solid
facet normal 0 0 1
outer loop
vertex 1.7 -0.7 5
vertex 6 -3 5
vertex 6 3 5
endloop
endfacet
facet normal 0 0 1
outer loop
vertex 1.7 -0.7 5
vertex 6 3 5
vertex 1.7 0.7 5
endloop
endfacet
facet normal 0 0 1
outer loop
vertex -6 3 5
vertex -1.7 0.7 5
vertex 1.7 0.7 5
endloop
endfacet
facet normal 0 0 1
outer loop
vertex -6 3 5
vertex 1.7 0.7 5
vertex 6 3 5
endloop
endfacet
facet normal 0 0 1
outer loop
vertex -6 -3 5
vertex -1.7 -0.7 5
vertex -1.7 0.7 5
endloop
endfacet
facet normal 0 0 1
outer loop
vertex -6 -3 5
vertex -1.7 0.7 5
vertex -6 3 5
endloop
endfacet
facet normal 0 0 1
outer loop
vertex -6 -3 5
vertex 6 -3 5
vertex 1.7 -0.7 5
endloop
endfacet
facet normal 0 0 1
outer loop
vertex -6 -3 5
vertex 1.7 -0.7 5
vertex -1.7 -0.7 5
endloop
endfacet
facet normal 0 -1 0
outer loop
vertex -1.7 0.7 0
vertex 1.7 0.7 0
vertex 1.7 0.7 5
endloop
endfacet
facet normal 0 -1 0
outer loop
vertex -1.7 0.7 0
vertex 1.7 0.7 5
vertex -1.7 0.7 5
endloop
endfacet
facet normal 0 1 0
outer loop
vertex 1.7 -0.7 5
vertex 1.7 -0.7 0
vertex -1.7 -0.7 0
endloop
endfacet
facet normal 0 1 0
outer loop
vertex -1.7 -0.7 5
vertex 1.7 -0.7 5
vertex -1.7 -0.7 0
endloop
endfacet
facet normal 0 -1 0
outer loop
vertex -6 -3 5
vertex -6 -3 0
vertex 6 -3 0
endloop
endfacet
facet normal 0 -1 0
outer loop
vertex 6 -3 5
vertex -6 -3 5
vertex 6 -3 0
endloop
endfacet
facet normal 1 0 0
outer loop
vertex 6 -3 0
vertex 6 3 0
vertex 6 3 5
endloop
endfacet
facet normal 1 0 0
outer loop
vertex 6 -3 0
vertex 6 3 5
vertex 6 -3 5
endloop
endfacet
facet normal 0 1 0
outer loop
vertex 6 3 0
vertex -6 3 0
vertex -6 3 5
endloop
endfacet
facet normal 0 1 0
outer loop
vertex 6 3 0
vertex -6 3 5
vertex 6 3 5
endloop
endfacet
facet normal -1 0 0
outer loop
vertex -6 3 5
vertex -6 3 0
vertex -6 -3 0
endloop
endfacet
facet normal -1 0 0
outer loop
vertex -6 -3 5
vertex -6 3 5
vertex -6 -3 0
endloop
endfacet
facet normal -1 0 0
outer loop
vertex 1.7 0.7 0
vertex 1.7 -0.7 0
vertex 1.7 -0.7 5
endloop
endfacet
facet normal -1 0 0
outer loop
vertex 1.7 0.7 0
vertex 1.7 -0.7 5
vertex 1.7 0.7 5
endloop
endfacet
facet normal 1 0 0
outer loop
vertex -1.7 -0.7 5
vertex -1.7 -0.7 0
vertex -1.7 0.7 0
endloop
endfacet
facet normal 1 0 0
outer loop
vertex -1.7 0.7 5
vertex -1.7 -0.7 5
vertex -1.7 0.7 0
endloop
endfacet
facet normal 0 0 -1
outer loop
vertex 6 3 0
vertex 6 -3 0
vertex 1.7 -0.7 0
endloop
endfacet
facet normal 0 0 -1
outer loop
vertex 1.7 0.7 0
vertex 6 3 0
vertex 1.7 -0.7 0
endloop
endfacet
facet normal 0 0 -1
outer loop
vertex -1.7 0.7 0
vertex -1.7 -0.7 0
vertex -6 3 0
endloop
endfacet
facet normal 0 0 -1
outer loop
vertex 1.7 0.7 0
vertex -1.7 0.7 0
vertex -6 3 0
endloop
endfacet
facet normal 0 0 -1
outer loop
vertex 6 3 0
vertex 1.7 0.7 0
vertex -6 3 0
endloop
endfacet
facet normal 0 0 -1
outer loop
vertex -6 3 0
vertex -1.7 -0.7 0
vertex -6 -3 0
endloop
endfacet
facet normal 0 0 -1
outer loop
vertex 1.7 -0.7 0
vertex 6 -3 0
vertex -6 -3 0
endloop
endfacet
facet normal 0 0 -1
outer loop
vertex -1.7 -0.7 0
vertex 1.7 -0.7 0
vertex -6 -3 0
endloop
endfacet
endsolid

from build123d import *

# Parameters (mm, degrees)
PAD002_DEPTH               = 5
PAD002_MIRRORED002_2_DEPTH = 5


with BuildPart() as part:
    # Sketch004 → Pad002 (new body)
    with BuildSketch(Plane.XY):
        Polygon((6, 0), (6, 3), (0, 3), (0, 0.7), (1.7, 0.7), (1.7, 0), align=None)
    pad002 = extrude(amount=PAD002_DEPTH)

    # Sketch004 Mirrored002 2 → Pad002 Mirrored002 2 (add)
    with BuildSketch(Plane(origin=(0, 0, 0), x_dir=(-1, 0, 0), z_dir=(0, 0, -1))):
        Polygon((6, 0), (6, 3), (0, 3), (0, 0.7), (1.7, 0.7), (1.7, 0), align=None)
    pad002_mirrored002_2 = extrude(amount=-PAD002_MIRRORED002_2_DEPTH)

    # Mirrored003: Pad002, Pad002 Mirrored002 2 across Sketch004 H_Axis
    add(pad002.mirror(Plane.ZX))
    add(pad002_mirrored002_2.mirror(Plane.ZX))


solid = part.part
